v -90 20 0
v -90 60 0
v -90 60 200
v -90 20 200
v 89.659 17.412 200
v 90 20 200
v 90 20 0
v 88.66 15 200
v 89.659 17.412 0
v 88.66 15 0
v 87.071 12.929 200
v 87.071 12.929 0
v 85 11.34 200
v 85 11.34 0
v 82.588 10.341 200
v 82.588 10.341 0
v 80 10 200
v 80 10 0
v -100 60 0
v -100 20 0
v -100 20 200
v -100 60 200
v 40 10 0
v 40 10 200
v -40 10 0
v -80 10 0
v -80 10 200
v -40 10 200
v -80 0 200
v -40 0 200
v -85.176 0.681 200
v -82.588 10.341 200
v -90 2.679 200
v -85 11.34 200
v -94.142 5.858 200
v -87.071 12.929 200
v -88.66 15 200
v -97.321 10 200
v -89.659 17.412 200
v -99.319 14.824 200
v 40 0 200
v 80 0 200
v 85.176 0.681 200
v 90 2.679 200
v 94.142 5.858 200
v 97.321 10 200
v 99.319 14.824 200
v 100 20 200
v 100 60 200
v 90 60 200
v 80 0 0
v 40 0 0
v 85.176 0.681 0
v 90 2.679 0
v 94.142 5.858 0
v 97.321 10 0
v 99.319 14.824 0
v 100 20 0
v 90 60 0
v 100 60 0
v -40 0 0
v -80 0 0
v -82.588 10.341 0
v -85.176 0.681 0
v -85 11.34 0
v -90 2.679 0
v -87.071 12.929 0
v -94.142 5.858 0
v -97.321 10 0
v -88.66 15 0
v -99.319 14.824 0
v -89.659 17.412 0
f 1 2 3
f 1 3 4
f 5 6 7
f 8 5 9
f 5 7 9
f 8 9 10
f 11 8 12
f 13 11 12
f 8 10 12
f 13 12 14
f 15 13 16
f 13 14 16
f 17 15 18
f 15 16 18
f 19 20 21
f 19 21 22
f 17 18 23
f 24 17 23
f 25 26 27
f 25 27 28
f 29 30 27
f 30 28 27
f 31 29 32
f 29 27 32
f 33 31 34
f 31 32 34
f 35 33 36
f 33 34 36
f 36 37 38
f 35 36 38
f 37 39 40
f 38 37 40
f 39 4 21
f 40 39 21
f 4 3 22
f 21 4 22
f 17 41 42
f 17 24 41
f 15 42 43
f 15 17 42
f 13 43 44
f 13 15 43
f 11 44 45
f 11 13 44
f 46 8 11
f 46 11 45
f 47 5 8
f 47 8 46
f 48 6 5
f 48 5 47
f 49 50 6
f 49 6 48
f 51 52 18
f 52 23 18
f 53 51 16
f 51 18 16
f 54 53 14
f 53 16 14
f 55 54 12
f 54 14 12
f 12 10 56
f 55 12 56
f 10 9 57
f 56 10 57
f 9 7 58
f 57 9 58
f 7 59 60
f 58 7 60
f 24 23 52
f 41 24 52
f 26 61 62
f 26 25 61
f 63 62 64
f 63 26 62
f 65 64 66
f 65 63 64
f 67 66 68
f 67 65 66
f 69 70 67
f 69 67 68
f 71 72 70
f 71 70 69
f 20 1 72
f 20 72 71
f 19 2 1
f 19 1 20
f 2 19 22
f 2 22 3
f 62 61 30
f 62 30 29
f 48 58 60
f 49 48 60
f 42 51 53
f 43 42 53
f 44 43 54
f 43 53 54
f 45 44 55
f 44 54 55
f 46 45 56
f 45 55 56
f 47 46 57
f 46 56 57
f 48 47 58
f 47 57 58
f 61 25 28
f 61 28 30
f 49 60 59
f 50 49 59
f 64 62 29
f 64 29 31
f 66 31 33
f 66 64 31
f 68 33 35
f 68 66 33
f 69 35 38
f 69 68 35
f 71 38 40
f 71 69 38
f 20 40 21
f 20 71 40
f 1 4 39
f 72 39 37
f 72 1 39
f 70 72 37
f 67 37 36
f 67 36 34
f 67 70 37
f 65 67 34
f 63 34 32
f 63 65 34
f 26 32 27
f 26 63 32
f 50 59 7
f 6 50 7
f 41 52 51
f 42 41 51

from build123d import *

# Parameters (mm, degrees)
SALIENTE_EXTRUIR1_DEPTH   = 200
SALIENTE_EXTRUIR1_2_DEPTH = 200


with BuildPart() as part:
    # Croquis1 → Saliente-Extruir1 (new body)
    with BuildSketch(Plane.XY):
        with BuildLine():
            Line((-40, 0), (-80, 0))
            ThreePointArc((-80, 0), (-94.142135624, 5.857864376), (-100, 20))
            Line((-100, 20), (-100, 60))
            Line((-100, 60), (-90, 60))
            Line((-90, 60), (-90, 20))
            ThreePointArc((-90, 20), (-87.071067812, 12.928932188), (-80, 10))
            Line((-80, 10), (-40, 10))
            Line((-40, 10), (-40, 0))
        make_face()
    extrude(amount=SALIENTE_EXTRUIR1_DEPTH)


with BuildPart() as body_2:
    # Croquis1 → Saliente-Extruir1 2 (new body)
    with BuildSketch(Plane.XY):
        with BuildLine():
            Line((40, 0), (80, 0))
            ThreePointArc((80, 0), (94.142135624, 5.857864376), (100, 20))
            Line((100, 20), (100, 60))
            Line((100, 60), (90, 60))
            Line((90, 60), (90, 20))
            ThreePointArc((90, 20), (87.071067812, 12.928932188), (80, 10))
            Line((80, 10), (40, 10))
            Line((40, 10), (40, 0))
        make_face()
    extrude(amount=SALIENTE_EXTRUIR1_2_DEPTH)


solid = Compound([part.part, body_2.part])
